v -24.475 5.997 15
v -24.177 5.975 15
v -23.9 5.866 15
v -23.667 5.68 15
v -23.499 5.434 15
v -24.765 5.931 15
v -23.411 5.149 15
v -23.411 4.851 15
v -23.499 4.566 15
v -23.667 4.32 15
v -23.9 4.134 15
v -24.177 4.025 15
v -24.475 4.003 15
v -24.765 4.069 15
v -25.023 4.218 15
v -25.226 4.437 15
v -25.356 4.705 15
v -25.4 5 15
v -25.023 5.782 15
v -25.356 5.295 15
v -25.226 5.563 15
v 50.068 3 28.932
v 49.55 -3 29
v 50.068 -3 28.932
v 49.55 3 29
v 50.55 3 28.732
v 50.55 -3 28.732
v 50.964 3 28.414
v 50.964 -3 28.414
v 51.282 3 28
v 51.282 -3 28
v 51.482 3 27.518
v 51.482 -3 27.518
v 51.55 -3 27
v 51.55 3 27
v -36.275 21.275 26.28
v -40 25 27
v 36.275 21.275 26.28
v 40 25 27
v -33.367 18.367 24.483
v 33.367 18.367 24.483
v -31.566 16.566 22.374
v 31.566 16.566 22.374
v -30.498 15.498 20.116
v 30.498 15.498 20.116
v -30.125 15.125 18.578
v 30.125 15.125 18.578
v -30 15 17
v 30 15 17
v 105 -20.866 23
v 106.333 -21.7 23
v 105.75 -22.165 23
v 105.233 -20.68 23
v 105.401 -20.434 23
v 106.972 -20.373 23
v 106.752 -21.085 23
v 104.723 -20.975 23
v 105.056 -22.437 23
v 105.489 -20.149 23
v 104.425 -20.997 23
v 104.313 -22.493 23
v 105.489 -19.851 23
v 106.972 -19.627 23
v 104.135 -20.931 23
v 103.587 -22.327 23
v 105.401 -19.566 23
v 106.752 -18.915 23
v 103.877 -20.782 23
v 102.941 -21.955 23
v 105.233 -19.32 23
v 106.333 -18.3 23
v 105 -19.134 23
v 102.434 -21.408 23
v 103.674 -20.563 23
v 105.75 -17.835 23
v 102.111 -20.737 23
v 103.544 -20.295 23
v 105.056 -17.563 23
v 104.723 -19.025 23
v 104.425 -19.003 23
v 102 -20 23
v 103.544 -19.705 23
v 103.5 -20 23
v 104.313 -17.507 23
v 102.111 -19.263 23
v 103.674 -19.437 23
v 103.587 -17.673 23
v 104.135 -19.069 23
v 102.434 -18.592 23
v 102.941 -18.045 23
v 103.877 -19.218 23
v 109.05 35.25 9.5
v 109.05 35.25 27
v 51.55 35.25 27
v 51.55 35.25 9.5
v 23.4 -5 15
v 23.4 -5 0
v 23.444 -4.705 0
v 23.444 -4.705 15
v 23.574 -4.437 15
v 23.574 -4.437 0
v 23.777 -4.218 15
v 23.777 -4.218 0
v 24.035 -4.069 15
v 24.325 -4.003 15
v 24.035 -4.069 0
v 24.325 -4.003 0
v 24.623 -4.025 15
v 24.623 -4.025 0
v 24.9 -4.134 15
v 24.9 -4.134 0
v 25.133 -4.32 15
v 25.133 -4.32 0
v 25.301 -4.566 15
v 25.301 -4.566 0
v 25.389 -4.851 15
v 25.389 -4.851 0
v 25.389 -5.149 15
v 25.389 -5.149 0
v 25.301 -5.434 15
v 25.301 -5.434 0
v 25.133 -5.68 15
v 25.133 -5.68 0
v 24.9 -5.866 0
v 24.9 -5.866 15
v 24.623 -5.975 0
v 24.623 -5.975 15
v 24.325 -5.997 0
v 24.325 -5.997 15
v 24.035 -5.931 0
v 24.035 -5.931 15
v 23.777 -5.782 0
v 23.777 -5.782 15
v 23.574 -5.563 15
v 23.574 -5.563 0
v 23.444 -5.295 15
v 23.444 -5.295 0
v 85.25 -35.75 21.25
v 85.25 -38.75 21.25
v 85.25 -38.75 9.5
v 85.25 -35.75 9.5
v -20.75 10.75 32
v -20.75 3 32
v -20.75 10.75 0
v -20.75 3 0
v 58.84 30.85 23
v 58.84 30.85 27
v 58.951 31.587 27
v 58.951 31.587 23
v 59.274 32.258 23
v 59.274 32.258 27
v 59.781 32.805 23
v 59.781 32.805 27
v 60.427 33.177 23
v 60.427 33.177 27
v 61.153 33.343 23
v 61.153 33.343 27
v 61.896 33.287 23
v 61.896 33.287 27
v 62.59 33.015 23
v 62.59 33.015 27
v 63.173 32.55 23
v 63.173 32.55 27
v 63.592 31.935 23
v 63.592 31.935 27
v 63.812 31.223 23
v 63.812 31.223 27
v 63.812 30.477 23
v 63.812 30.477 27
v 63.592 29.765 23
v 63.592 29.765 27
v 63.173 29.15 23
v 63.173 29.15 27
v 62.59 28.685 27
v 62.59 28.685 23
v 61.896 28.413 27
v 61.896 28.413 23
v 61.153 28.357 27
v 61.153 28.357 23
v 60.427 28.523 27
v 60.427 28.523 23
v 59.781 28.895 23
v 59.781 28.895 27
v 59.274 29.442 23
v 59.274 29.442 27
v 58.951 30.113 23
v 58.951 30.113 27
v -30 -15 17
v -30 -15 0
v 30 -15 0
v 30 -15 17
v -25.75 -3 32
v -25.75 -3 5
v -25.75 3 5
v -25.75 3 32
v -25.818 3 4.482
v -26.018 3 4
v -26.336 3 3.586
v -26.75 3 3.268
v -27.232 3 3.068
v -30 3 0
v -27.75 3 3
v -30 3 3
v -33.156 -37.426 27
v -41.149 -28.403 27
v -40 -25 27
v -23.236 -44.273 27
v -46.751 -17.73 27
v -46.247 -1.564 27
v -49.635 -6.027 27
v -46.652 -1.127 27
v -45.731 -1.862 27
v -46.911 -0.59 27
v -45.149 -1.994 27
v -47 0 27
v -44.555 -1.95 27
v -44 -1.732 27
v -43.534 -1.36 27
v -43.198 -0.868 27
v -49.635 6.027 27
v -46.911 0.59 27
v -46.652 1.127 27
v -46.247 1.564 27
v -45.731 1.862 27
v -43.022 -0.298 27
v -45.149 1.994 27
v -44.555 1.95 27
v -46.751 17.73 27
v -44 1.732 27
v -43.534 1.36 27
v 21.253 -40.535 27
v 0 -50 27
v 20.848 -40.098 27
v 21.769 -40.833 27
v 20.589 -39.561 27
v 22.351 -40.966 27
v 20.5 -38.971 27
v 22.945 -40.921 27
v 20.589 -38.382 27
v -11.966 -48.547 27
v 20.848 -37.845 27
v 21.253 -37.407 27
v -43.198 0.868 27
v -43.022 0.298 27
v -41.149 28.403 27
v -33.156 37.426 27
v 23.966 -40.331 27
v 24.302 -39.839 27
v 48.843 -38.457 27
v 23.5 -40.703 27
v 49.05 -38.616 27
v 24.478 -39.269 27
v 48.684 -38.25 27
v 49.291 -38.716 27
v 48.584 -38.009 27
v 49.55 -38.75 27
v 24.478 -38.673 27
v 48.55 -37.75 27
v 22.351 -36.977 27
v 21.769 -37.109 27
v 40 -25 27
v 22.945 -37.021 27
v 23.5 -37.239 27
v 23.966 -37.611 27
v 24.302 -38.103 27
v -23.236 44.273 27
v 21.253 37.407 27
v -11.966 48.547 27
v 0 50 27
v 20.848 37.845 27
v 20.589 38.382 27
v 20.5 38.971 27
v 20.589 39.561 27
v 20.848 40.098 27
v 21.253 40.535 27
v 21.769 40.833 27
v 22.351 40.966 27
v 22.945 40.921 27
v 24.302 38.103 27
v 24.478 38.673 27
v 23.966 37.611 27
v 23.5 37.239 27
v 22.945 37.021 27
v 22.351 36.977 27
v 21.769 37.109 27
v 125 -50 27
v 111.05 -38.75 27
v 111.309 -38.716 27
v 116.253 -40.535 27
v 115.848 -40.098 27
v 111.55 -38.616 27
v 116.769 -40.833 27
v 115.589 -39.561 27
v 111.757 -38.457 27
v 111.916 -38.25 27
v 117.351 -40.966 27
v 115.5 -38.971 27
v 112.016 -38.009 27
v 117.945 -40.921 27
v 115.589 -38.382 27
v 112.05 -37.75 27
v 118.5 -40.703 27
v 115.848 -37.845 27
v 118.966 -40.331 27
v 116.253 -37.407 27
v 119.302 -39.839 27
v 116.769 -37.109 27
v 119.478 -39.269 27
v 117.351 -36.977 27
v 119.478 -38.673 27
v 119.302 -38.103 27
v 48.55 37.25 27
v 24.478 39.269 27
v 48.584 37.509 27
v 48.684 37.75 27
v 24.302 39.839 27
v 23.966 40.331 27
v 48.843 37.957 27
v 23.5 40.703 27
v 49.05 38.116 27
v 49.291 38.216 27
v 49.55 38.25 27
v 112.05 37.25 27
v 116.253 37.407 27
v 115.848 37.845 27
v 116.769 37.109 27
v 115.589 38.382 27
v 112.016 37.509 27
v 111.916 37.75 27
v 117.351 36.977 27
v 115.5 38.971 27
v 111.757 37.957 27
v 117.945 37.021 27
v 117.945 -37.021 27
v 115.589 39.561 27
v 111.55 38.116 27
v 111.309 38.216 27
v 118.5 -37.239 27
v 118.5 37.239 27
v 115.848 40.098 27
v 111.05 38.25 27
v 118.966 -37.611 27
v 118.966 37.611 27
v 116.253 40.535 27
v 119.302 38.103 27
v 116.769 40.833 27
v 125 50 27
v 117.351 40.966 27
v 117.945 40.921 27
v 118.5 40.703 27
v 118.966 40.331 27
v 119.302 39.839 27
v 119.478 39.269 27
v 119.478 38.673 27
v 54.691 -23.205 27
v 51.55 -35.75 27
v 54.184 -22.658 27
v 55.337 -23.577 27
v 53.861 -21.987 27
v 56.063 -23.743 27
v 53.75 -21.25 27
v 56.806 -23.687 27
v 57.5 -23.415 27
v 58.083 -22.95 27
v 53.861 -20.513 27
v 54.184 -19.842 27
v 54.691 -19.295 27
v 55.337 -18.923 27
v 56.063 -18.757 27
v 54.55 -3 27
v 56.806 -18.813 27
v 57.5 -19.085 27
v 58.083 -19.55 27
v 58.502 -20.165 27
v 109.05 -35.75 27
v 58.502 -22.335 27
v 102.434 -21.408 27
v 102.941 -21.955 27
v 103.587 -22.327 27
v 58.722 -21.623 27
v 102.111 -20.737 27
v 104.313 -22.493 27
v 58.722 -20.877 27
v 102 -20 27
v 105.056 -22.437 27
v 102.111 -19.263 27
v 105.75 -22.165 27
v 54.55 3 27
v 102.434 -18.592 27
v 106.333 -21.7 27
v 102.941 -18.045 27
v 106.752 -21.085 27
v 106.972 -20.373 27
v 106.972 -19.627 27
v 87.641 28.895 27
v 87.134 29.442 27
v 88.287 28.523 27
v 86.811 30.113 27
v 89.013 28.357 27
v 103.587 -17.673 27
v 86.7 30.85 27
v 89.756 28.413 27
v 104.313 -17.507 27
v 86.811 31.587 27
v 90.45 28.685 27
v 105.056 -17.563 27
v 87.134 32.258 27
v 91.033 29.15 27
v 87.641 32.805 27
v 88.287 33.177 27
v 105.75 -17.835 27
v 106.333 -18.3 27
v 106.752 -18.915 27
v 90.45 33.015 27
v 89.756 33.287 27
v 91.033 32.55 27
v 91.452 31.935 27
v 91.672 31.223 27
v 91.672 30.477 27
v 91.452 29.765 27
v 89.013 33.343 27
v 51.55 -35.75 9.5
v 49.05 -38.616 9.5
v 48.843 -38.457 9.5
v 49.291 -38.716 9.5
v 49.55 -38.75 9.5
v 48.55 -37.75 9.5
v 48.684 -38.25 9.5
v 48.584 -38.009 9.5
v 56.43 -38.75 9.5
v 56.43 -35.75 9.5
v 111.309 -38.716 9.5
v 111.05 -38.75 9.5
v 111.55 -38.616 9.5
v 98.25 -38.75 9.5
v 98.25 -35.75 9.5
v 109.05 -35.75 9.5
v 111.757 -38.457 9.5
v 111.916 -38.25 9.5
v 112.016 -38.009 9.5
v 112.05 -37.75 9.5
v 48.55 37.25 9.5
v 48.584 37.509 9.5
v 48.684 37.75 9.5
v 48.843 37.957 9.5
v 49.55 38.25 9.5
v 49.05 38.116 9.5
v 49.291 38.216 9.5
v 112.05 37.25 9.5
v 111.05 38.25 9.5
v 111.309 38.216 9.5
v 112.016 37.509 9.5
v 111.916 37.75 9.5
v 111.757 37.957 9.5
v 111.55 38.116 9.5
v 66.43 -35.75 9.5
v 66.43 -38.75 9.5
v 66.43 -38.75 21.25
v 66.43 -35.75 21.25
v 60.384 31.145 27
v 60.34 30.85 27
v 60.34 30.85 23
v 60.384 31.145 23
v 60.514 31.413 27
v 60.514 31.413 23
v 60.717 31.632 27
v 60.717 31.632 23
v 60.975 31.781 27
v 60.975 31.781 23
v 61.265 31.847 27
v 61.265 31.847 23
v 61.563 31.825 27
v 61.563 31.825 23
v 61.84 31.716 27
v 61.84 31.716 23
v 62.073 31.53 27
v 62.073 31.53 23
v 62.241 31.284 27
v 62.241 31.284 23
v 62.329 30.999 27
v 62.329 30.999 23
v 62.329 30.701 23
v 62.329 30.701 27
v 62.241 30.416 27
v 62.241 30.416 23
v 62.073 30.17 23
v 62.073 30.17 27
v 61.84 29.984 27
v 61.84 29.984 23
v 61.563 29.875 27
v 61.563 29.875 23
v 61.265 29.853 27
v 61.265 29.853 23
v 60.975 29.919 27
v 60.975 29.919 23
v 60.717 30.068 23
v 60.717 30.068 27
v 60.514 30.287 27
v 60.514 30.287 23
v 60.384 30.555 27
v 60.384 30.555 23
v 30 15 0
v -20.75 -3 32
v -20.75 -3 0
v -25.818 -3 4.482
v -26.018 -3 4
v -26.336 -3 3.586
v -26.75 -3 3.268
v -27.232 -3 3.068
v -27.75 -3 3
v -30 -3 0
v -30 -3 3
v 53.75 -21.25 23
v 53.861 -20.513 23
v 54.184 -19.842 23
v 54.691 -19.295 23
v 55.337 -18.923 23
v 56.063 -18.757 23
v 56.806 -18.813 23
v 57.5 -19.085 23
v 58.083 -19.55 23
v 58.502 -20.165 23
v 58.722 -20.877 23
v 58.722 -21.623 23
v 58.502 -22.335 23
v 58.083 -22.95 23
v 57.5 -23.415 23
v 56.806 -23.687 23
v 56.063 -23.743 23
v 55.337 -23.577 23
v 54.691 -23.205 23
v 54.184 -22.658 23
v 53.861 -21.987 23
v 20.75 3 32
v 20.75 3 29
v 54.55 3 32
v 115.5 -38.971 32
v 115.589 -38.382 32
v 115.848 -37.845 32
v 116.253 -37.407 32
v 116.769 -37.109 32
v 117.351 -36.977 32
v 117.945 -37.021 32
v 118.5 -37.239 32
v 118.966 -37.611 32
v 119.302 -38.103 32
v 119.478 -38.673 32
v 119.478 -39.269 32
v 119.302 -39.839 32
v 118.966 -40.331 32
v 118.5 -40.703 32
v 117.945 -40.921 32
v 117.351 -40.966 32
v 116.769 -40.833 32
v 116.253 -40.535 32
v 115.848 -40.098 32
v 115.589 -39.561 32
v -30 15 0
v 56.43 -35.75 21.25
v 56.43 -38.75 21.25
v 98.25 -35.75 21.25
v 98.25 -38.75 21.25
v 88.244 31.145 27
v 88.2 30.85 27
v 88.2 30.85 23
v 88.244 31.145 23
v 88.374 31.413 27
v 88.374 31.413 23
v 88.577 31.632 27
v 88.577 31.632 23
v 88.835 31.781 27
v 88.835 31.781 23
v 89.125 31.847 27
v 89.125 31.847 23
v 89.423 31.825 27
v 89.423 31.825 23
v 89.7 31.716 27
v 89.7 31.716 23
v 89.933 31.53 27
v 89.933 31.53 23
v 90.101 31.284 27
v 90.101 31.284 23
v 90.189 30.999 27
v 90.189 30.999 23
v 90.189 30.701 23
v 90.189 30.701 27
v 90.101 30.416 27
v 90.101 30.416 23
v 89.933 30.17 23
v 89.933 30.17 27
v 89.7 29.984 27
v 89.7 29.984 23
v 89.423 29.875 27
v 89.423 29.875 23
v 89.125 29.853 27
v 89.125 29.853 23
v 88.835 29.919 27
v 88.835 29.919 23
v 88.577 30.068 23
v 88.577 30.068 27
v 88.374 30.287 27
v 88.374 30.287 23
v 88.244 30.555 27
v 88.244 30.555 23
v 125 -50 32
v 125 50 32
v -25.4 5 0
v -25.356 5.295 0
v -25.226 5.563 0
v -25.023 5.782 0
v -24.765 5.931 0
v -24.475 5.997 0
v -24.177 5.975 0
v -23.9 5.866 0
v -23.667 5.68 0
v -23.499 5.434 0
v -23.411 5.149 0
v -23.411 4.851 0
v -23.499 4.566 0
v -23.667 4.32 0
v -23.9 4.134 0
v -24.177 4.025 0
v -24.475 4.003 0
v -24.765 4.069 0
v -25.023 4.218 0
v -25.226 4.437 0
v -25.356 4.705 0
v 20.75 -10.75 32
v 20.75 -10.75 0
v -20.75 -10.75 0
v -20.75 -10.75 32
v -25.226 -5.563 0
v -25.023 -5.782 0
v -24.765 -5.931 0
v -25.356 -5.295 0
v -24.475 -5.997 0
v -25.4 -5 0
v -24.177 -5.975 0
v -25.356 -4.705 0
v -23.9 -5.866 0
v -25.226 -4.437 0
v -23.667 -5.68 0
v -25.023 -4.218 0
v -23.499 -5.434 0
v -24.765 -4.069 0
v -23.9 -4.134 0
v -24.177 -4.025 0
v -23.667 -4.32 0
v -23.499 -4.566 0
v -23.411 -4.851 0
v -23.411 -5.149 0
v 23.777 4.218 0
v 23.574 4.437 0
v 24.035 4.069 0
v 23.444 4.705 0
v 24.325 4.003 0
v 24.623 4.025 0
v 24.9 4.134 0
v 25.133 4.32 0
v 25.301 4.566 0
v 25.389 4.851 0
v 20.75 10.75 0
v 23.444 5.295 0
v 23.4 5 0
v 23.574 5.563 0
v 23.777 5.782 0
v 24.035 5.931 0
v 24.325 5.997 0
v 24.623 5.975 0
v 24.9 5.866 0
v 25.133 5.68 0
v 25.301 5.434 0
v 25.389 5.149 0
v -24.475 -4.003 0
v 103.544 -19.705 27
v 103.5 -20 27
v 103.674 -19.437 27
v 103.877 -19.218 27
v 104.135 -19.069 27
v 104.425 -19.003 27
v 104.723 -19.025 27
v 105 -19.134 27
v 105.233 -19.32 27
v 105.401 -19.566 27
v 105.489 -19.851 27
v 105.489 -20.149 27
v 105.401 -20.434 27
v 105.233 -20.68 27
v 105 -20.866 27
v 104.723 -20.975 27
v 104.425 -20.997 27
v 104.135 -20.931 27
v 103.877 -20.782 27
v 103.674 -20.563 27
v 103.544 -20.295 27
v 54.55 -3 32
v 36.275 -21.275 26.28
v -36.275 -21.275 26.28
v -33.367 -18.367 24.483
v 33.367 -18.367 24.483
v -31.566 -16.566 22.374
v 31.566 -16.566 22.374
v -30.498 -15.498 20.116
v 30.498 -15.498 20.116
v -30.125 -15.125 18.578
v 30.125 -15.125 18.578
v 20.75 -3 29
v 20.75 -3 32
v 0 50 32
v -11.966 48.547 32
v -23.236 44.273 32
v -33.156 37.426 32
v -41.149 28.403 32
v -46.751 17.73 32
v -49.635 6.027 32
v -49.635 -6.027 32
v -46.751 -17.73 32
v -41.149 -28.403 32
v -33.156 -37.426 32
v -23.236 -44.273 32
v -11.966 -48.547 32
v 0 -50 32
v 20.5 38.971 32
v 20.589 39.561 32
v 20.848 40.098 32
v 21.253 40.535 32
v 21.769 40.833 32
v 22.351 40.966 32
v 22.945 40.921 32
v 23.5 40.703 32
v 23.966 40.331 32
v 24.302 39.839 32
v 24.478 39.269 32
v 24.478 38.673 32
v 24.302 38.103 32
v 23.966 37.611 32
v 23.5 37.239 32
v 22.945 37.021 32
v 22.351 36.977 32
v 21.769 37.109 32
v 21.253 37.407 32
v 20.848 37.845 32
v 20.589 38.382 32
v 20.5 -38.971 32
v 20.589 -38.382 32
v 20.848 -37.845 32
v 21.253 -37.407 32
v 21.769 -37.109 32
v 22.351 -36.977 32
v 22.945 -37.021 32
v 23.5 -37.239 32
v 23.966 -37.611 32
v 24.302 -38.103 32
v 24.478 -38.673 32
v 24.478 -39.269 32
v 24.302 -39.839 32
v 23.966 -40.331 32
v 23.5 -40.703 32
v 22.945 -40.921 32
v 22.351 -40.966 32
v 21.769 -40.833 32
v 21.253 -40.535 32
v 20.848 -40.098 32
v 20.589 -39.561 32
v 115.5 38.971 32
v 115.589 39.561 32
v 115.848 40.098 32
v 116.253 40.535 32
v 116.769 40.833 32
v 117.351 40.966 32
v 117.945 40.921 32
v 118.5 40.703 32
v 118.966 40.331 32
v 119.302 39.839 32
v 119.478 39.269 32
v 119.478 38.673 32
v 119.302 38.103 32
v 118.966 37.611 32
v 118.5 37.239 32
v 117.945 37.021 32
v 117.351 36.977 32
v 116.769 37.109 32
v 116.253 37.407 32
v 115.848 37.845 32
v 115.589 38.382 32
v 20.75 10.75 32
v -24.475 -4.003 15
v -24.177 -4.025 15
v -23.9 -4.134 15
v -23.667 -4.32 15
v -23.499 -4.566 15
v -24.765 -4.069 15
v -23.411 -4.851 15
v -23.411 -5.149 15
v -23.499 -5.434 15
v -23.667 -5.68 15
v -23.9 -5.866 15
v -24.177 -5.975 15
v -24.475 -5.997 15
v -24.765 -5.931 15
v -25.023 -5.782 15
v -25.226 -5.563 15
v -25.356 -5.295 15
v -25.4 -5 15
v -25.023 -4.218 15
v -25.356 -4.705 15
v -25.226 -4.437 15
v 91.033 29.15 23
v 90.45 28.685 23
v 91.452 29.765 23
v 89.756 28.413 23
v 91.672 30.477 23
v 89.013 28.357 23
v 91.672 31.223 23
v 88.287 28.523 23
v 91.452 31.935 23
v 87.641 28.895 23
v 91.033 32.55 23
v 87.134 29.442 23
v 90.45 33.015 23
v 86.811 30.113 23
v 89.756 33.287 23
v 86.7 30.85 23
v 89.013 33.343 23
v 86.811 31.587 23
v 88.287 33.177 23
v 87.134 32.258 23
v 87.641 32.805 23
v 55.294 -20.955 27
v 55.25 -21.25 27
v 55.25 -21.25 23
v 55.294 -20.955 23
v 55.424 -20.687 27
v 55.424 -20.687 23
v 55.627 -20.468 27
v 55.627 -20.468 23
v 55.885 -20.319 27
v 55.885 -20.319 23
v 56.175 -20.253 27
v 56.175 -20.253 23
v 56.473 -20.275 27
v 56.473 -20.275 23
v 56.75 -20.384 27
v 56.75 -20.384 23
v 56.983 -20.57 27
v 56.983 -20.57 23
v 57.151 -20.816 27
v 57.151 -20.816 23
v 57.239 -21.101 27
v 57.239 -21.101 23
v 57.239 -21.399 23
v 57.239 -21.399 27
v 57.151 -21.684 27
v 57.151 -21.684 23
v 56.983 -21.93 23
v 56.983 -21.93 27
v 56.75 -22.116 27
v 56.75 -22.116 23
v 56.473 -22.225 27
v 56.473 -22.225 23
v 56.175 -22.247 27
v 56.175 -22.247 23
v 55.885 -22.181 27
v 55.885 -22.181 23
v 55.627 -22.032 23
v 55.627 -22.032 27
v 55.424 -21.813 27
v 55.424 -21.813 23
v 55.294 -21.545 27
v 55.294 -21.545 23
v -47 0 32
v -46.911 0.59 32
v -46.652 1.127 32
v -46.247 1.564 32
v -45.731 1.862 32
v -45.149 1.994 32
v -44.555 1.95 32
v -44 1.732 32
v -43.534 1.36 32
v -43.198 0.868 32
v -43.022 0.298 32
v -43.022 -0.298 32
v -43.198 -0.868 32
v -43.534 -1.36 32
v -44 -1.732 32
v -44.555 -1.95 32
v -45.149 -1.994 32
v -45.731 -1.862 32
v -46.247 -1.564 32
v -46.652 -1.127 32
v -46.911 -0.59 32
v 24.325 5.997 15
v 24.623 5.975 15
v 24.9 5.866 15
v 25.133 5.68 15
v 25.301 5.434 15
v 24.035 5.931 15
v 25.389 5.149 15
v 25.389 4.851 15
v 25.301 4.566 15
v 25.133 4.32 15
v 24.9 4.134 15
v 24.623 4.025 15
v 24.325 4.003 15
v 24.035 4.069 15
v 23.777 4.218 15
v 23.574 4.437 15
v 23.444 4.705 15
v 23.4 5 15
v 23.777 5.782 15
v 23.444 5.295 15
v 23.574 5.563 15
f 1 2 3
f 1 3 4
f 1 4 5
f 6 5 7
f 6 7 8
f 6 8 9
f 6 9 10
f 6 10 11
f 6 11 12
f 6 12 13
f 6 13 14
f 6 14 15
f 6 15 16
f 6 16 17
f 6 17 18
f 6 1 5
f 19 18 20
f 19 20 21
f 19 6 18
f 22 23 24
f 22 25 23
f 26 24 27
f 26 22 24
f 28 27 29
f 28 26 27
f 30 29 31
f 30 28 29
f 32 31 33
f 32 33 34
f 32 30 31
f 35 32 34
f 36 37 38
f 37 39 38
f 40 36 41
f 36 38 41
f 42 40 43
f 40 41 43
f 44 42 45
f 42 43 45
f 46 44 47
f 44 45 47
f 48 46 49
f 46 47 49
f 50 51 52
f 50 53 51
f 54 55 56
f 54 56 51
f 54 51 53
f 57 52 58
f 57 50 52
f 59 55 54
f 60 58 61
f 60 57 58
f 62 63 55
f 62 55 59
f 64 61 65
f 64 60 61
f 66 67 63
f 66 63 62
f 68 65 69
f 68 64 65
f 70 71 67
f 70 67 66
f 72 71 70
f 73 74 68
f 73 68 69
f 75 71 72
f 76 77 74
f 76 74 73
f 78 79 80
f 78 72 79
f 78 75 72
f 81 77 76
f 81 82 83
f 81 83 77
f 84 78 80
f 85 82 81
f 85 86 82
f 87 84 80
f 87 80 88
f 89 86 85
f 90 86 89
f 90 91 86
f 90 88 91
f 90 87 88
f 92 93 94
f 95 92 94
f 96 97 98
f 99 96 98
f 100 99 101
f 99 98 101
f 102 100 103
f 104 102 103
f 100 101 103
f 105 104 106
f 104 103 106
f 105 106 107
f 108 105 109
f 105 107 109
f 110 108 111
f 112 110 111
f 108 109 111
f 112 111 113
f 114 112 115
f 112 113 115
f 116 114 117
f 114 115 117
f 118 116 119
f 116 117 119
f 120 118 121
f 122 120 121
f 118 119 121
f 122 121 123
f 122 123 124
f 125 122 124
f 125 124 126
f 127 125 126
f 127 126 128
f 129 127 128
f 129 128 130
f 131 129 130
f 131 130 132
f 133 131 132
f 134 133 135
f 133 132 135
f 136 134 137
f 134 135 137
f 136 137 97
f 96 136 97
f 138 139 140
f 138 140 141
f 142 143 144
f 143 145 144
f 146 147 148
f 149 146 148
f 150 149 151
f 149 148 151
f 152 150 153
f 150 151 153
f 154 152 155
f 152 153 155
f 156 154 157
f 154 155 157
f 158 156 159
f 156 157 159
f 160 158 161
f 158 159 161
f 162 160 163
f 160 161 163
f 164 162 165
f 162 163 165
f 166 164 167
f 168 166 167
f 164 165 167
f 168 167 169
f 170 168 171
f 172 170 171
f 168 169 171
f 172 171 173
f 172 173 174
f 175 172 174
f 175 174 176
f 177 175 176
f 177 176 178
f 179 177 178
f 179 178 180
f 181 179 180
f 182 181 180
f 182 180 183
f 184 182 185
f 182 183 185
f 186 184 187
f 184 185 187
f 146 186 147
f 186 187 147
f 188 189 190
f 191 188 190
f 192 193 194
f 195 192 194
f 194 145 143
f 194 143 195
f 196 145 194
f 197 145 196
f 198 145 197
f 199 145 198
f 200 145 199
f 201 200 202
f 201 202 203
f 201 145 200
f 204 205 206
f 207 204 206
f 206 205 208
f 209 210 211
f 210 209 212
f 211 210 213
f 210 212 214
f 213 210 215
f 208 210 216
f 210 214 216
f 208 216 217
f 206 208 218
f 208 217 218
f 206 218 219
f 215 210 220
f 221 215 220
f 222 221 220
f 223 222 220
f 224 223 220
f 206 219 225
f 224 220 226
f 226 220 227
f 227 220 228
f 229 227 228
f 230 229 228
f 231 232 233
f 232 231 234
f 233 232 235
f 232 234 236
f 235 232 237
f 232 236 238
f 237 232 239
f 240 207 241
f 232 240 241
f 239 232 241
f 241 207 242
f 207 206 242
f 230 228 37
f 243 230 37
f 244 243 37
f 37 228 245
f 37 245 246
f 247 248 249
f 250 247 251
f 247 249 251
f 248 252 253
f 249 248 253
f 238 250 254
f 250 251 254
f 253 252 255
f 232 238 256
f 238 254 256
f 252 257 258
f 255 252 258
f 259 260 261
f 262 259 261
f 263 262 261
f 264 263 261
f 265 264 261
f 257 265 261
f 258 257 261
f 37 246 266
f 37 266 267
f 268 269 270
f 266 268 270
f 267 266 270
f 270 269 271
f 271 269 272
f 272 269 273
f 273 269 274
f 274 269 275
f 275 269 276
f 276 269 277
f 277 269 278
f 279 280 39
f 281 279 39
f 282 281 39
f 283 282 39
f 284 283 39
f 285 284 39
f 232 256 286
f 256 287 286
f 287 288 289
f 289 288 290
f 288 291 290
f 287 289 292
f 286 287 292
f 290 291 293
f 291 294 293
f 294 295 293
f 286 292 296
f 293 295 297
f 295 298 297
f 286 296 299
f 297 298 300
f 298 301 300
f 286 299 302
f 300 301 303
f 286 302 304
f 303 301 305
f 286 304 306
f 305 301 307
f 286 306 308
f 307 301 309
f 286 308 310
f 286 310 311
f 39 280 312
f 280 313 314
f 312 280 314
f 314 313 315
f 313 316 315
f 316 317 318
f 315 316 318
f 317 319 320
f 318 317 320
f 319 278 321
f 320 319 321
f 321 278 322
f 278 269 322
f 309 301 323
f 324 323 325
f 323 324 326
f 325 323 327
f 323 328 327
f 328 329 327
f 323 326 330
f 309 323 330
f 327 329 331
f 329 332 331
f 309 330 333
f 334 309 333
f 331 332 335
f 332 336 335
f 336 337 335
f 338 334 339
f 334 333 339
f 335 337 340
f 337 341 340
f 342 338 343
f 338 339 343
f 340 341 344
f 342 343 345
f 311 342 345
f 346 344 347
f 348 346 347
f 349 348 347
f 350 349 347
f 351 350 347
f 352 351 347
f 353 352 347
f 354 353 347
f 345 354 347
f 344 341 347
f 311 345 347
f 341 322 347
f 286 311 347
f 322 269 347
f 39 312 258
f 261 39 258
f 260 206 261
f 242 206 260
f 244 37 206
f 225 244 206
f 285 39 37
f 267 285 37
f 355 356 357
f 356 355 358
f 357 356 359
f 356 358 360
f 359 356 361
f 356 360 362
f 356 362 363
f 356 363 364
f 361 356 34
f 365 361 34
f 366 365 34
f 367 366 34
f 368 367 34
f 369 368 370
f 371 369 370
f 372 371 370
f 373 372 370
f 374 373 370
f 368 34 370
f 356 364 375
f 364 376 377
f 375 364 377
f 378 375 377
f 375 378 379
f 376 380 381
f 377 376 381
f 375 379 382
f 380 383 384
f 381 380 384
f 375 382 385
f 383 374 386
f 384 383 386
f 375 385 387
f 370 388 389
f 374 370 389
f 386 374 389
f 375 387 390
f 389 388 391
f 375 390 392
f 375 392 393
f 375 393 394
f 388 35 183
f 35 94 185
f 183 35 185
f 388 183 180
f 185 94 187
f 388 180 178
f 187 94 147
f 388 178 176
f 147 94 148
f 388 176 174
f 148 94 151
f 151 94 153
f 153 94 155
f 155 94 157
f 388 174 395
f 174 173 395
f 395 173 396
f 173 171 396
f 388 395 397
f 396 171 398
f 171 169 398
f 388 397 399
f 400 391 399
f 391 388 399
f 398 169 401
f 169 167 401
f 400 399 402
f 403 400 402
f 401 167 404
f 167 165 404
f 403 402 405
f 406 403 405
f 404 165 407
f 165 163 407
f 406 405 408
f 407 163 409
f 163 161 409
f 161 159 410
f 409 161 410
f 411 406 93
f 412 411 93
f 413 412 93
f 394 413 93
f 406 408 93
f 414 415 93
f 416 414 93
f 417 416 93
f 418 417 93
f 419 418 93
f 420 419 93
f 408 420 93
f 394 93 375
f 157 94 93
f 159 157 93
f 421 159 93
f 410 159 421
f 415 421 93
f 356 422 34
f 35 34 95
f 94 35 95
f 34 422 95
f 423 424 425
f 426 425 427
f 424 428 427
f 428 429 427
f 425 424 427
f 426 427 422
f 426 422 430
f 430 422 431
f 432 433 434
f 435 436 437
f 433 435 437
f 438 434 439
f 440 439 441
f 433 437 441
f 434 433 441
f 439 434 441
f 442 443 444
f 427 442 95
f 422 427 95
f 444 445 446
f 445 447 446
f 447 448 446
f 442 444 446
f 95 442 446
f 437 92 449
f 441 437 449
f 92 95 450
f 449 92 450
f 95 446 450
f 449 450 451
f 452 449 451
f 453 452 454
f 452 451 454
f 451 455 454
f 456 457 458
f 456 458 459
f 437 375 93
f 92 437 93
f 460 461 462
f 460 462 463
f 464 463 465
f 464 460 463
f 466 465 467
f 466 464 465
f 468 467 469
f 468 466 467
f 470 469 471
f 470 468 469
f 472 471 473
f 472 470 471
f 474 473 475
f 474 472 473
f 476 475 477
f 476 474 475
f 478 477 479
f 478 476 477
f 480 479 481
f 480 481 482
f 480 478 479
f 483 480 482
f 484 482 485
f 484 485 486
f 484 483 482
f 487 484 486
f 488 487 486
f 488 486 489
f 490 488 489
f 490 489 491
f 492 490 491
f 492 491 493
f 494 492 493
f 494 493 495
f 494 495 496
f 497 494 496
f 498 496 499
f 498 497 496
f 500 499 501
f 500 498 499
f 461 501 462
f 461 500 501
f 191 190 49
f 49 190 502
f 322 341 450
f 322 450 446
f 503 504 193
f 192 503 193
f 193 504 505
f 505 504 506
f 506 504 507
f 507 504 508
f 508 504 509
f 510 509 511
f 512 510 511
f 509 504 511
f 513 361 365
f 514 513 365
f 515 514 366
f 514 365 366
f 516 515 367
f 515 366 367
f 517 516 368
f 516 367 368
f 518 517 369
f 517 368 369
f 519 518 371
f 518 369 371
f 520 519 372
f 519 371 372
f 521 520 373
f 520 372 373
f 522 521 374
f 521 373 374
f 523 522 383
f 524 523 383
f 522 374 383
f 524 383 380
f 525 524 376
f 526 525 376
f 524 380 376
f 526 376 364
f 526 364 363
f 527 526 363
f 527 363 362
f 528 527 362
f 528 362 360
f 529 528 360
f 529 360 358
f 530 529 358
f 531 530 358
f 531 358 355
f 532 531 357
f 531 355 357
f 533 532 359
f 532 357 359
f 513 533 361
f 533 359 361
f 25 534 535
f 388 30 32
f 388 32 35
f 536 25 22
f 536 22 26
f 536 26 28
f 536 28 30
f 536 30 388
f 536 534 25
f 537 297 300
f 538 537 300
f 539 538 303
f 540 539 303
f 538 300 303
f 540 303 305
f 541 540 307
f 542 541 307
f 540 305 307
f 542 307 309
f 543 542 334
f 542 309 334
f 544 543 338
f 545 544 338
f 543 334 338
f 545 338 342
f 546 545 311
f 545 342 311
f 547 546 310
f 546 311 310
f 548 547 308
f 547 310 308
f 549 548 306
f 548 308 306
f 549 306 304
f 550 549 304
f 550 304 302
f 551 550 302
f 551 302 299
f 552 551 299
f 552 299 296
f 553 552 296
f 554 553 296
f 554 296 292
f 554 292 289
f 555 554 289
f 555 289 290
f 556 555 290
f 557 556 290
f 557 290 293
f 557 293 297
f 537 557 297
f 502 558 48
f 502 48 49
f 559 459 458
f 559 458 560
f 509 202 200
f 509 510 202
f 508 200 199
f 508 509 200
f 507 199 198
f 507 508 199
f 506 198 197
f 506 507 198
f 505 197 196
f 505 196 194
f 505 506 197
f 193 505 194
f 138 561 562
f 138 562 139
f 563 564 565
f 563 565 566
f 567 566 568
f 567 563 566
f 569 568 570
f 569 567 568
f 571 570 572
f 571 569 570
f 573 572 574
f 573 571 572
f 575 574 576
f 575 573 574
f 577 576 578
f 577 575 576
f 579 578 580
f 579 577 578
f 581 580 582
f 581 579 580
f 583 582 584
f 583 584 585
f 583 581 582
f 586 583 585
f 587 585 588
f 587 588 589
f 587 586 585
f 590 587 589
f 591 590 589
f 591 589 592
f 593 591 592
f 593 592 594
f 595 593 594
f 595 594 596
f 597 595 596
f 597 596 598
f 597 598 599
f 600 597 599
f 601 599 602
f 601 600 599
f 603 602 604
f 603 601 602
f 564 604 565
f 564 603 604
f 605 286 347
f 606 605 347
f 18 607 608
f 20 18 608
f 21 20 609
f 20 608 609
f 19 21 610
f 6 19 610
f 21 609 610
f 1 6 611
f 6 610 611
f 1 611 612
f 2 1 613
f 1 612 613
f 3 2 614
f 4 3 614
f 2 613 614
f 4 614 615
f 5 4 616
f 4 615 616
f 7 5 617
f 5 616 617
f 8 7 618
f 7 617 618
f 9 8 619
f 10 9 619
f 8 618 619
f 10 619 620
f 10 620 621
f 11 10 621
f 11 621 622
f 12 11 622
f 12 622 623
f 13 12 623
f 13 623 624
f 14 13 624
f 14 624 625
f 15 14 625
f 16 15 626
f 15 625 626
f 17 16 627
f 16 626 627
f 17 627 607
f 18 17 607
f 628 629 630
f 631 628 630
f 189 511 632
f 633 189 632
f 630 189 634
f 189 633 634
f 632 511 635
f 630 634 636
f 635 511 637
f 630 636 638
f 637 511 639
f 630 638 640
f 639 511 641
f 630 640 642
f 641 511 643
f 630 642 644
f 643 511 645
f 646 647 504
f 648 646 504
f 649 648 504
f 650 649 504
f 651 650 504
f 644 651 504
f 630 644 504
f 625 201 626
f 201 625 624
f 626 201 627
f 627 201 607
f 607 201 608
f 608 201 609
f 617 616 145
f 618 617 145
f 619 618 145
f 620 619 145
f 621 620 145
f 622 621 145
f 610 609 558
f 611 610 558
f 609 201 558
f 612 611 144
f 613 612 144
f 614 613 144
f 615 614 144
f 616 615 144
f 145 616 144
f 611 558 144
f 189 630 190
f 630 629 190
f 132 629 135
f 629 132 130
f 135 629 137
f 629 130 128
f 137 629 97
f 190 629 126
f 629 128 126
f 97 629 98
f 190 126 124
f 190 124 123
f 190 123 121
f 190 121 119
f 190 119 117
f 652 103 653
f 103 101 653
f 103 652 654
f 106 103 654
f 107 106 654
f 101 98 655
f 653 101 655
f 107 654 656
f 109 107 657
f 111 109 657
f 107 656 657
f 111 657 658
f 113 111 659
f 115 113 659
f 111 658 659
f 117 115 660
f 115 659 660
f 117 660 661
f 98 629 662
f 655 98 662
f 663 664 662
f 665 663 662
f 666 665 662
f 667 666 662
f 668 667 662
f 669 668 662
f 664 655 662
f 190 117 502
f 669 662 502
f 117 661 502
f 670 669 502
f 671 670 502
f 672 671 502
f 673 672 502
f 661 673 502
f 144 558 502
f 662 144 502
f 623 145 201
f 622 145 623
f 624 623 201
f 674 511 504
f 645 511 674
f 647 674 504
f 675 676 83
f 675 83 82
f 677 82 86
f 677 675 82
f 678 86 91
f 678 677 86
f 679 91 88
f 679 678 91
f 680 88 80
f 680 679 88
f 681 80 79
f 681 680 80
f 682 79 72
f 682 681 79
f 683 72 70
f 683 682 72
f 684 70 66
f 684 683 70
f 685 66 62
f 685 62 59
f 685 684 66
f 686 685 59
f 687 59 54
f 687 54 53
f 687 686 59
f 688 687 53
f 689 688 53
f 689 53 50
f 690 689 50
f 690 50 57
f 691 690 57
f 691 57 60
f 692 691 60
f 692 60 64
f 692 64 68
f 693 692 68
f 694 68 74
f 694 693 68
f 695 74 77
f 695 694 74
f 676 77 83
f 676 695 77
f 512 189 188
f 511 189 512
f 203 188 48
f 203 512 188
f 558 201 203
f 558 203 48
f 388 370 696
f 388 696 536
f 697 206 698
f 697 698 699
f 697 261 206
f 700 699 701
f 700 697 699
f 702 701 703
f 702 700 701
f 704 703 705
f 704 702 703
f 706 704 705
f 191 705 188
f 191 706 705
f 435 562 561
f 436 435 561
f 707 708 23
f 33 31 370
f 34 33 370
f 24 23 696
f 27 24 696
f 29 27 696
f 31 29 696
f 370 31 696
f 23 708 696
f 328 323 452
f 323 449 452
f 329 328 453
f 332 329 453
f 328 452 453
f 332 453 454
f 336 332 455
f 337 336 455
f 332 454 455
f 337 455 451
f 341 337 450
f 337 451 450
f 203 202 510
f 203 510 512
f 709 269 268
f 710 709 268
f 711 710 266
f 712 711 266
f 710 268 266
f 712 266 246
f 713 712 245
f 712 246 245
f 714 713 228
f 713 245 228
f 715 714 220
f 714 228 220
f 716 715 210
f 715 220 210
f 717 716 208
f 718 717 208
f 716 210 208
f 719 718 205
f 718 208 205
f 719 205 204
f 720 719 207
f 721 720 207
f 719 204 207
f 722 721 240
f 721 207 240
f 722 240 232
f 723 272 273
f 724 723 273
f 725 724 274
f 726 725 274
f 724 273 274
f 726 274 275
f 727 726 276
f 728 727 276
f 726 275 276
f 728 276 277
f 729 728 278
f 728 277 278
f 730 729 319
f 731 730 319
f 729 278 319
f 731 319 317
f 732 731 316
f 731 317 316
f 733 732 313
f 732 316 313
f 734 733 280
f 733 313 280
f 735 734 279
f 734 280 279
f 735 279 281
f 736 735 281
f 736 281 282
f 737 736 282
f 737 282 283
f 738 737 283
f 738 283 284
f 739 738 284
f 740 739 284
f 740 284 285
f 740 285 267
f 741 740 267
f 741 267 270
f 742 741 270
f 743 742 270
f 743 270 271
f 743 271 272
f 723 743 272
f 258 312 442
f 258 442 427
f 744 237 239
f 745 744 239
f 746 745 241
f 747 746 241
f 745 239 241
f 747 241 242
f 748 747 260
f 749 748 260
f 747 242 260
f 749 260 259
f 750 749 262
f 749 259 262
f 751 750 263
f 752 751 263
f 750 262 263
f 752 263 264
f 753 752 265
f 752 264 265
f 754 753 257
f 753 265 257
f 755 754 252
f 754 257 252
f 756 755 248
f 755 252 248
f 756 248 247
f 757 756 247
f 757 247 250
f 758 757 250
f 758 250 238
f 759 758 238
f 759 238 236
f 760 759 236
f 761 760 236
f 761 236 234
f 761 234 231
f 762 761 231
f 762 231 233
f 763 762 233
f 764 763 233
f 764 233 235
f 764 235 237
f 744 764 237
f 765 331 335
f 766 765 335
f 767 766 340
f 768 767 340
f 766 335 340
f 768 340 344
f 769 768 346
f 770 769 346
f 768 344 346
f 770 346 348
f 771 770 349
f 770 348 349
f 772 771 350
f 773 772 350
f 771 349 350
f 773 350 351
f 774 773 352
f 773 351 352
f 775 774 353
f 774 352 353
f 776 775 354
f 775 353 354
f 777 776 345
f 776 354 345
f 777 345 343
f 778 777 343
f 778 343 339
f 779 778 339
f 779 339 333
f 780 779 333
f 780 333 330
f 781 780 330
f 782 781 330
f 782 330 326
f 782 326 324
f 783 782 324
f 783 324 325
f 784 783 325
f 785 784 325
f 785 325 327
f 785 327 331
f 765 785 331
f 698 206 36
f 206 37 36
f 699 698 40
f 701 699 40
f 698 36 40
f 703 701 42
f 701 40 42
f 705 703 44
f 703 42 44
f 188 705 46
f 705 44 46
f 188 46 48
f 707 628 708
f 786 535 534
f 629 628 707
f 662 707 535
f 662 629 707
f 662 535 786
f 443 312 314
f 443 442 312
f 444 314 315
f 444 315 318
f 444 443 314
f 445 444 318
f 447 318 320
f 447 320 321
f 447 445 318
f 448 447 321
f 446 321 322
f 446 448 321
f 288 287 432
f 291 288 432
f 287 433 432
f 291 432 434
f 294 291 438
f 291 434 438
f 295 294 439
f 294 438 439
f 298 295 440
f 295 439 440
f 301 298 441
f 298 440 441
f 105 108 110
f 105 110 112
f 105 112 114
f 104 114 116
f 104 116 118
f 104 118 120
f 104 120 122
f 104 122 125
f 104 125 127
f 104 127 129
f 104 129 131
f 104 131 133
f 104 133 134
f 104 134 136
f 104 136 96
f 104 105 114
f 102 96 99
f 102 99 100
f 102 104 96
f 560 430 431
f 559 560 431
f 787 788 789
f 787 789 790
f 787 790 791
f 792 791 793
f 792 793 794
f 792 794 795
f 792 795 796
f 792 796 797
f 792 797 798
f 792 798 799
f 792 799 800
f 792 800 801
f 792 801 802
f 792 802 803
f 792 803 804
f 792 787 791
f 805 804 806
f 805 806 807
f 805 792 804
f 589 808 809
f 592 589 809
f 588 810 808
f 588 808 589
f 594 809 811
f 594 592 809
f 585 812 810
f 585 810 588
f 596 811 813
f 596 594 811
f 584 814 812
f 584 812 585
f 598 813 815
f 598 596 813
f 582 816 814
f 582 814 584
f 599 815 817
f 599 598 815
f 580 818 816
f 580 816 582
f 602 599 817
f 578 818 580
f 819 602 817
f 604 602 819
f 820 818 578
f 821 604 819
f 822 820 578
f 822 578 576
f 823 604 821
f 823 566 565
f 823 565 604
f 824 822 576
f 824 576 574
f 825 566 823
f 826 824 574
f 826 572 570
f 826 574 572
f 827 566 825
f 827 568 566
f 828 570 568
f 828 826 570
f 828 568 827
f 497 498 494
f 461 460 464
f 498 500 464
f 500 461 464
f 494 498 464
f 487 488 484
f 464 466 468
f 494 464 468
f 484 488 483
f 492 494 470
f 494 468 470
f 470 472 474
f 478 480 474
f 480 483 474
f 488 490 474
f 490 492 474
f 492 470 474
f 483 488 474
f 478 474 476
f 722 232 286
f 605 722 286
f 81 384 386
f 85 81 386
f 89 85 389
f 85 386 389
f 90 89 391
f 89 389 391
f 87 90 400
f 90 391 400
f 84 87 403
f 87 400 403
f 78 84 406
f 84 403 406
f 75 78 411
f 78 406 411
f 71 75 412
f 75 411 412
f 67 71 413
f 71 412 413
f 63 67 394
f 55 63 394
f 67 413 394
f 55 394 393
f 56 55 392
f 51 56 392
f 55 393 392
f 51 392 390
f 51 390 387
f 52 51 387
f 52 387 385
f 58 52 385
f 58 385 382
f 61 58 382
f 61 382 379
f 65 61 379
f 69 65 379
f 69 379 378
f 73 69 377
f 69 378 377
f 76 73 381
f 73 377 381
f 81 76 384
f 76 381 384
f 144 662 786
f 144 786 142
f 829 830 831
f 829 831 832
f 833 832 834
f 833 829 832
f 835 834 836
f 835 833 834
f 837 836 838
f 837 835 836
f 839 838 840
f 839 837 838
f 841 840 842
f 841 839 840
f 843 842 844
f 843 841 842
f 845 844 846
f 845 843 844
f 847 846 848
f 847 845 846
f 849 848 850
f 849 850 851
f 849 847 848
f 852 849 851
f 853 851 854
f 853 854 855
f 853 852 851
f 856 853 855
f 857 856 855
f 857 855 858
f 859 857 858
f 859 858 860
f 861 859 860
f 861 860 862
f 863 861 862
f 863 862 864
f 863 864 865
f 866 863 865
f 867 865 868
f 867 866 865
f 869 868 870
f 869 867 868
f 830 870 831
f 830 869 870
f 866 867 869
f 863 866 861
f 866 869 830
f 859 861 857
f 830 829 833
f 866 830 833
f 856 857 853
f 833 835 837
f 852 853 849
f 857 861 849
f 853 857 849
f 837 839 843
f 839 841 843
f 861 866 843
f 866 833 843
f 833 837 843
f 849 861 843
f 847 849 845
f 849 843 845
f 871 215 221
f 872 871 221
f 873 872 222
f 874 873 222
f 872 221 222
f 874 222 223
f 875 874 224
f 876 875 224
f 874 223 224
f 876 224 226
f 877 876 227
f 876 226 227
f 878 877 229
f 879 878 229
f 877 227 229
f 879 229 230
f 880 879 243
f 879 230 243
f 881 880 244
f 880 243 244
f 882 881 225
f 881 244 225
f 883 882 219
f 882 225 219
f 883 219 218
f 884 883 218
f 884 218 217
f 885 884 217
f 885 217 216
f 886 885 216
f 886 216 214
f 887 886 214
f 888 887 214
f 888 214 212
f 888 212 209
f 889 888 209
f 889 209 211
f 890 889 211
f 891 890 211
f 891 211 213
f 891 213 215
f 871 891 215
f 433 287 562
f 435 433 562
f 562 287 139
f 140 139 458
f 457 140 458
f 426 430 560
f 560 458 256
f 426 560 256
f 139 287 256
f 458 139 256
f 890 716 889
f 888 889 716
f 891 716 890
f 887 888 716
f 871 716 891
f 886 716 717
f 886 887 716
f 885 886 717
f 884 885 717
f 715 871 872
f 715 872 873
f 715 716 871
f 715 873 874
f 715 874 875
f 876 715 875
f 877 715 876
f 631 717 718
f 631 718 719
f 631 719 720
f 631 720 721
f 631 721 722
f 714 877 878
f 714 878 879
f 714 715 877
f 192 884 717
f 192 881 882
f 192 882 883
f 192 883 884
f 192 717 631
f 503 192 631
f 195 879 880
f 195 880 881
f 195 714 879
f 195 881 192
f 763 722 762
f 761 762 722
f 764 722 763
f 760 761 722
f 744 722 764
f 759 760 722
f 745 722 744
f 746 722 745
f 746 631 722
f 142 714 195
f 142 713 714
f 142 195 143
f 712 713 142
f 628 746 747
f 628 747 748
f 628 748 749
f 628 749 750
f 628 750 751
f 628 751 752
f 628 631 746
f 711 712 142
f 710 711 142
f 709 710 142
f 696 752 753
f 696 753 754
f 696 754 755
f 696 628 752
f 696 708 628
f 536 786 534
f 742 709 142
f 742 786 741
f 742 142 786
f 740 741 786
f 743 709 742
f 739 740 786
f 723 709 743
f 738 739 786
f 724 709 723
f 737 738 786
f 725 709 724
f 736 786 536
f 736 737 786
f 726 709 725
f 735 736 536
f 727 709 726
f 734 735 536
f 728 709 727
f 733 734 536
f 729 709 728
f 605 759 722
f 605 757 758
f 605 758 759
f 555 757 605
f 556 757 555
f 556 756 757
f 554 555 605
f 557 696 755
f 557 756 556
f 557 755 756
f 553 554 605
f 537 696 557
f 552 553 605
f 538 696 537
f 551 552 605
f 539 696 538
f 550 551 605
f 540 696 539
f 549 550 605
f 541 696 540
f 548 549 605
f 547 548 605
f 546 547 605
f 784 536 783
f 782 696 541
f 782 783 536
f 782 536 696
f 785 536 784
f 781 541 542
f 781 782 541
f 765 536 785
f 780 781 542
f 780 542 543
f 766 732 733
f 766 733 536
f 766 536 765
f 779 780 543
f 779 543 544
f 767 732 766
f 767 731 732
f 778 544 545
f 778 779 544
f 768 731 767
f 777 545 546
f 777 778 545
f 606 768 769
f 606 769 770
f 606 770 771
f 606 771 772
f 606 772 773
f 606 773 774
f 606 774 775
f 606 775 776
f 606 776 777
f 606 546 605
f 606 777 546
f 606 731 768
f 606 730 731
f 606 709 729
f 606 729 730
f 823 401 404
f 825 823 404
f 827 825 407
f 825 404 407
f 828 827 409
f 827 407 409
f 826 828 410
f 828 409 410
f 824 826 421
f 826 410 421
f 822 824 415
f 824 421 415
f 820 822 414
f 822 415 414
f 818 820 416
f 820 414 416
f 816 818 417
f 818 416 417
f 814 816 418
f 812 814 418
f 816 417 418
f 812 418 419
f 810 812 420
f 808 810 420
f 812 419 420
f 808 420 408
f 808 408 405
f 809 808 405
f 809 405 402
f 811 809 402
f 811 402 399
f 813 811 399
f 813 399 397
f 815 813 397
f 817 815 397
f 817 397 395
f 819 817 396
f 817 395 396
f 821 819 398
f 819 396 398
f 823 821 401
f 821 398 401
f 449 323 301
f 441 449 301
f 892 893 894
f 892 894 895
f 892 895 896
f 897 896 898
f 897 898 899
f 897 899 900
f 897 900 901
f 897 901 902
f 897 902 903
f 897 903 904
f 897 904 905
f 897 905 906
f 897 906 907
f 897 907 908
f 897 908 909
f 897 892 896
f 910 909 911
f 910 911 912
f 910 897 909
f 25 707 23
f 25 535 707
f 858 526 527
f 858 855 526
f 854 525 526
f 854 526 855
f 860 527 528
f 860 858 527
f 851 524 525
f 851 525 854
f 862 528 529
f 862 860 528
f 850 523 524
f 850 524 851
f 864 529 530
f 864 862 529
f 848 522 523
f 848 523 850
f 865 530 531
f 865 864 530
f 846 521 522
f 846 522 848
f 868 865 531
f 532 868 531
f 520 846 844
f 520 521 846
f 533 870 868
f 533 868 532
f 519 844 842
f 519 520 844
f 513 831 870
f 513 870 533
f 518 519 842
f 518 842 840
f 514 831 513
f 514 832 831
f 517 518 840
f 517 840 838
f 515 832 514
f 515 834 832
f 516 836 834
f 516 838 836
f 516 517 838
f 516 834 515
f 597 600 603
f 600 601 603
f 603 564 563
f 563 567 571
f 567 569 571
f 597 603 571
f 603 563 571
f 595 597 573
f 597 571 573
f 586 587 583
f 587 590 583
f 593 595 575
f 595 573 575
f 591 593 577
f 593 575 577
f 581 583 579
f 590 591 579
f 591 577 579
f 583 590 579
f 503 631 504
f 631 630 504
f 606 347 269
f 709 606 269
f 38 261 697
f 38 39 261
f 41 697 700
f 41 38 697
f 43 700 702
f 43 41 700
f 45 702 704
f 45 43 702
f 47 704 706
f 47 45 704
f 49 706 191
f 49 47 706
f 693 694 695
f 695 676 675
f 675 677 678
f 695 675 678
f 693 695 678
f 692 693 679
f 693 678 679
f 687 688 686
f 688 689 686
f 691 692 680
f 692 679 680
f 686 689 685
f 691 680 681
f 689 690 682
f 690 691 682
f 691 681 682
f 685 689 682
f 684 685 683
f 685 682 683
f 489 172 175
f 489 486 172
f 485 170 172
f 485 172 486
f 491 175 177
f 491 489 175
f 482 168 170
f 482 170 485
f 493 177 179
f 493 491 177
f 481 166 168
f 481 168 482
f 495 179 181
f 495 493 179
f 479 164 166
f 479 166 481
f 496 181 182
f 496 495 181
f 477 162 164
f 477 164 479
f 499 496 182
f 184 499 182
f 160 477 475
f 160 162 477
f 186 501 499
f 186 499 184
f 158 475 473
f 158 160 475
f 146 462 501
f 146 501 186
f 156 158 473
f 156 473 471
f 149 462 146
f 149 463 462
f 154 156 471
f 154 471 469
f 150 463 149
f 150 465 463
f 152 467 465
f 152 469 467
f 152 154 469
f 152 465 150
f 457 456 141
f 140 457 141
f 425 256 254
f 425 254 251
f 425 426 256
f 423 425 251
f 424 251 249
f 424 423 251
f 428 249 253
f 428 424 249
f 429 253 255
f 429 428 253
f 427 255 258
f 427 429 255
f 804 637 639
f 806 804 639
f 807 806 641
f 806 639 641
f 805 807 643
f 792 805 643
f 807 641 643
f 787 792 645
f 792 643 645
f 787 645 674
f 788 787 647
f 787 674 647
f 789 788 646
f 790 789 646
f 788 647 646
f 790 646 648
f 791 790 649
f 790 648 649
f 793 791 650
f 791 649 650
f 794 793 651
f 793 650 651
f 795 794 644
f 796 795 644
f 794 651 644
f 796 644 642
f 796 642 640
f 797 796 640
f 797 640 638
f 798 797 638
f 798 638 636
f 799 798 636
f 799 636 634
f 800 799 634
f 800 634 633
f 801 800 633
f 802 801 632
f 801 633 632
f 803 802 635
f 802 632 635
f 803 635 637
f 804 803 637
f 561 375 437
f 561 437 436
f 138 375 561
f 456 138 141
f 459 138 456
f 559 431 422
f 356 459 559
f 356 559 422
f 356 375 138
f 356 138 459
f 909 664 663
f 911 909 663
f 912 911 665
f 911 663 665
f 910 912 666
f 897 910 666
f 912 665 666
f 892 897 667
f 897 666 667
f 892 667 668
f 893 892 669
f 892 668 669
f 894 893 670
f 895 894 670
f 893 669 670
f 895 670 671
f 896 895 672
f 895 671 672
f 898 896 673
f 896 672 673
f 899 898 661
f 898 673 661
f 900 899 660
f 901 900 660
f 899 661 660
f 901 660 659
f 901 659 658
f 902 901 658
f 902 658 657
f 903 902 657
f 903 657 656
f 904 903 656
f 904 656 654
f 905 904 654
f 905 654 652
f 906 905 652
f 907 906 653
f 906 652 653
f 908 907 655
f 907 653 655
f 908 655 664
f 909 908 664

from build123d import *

# Parameters (mm, degrees)
SKETCH1_W           = 60
SKETCH1_H           = 30
SKETCH1_W_2         = 41.5
SKETCH1_H_2         = 21.5
BOSS_EXTRUDE1_DEPTH = 27
SKETCH2_R           = 50
BOSS_EXTRUDE2_DEPTH = 5
FILLET2_R           = 10
SKETCH6_R           = 1
CUT_EXTRUDE2_DEPTH  = 15
SKETCH7_W           = 41.5
SKETCH7_H           = 21.5
CUT_EXTRUDE3_DEPTH  = 69
SKETCH8_W           = 10
SKETCH8_H           = 6
CUT_EXTRUDE4_DEPTH  = 75
SKETCH10_W          = 74.59493419
SKETCH10_H          = 6
CUT_EXTRUDE5_DEPTH  = 3
SKETCH11_R          = 2
CUT_EXTRUDE6_DEPTH  = 16
BOSS_EXTRUDE3_DEPTH = 5
SKETCH13_R          = 2.5
SKETCH13_R_2        = 1
BOSS_EXTRUDE4_DEPTH = 4
SKETCH14_R          = 2.5
SKETCH14_R_2        = 1
BOSS_EXTRUDE5_DEPTH = 4
SKETCH15_R          = 2.5
SKETCH15_R_2        = 1
BOSS_EXTRUDE6_DEPTH = 4
BOSS_EXTRUDE8_DEPTH = 17.5
SKETCH17_W          = 3
SKETCH17_H          = 6
CUT_EXTRUDE7_DEPTH  = 17.5
SKETCH18_W          = 1.640081146
SKETCH18_H          = 6
CUT_EXTRUDE8_DEPTH  = 3
SKETCH20_W          = 13
SKETCH20_H          = 15.827650688
CUT_EXTRUDE9_DEPTH  = 25
SKETCH21_W          = 10
SKETCH21_H          = 3
CUT_EXTRUDE10_DEPTH = 13.5
SKETCH23_W          = 13
SKETCH23_H          = 3
SKETCH23_W_2        = 10
BOSS_EXTRUDE9_DEPTH = 1.75
FILLET3_R           = 1
SKETCH24_R          = 2
CUT_EXTRUDE11_DEPTH = 17
SKETCH25_W          = 10.72256849
SKETCH25_H          = 6
CUT_EXTRUDE12_DEPTH = 3
FILLET4_R           = 2


with BuildPart() as part:
    # Sketch1 → Boss-Extrude1 (new body)
    with BuildSketch(Plane.XY):
        Rectangle(SKETCH1_W, SKETCH1_H)
        Rectangle(SKETCH1_W_2, SKETCH1_H_2, mode=Mode.SUBTRACT)
    extrude(amount=BOSS_EXTRUDE1_DEPTH)

    # Sketch2 → Boss-Extrude2 (add)
    with BuildSketch(Plane.XY.offset(27)):
        Circle(SKETCH2_R)
    extrude(amount=BOSS_EXTRUDE2_DEPTH)

    # Fillet2
    fillet2_edges = [part.edges().sort_by_distance(p)[0] for p in [
        (30, 0, 27),
        (0, 15, 27),
        (-30, 0, 27),
        (0, -15, 27),
    ]]
    fillet(fillet2_edges, radius=FILLET2_R)

    # Sketch6 → Cut-Extrude2 (cut)
    with BuildSketch(Plane(origin=(0, 0, 0), x_dir=(-1, 0, 0), z_dir=(0, 0, -1))):
        with Locations((24.4, 5)):
            Circle(SKETCH6_R)
        with Locations((-24.4, 5)):
            Circle(SKETCH6_R)
        with Locations((24.4, -5)):
            Circle(SKETCH6_R)
        with Locations((-24.4, -5)):
            Circle(SKETCH6_R)
    extrude(amount=-CUT_EXTRUDE2_DEPTH, mode=Mode.SUBTRACT)

    # Sketch7 → Cut-Extrude3 (cut)
    with BuildSketch(Plane(origin=(0, 0, 0), x_dir=(-1, 0, 0), z_dir=(0, 0, -1))):
        Rectangle(SKETCH7_W, SKETCH7_H)
    extrude(amount=-CUT_EXTRUDE3_DEPTH, mode=Mode.SUBTRACT)

    # Sketch8 → Cut-Extrude4 (cut)
    with BuildSketch(Plane(origin=(0, 0, 0), x_dir=(-1, 0, 0), z_dir=(0, 0, -1))):
        with Locations((20.75, 0)):
            Rectangle(SKETCH8_W, SKETCH8_H)
    extrude(amount=-CUT_EXTRUDE4_DEPTH, mode=Mode.SUBTRACT)

    # Sketch10 → Cut-Extrude5 (cut)
    with BuildSketch(Plane.XY.offset(32)):
        with Locations((37.297467095, 0)):
            Rectangle(SKETCH10_W, SKETCH10_H)
    extrude(amount=-CUT_EXTRUDE5_DEPTH, mode=Mode.SUBTRACT)

    # Sketch11 → Cut-Extrude6 (cut)
    with BuildSketch(Plane(origin=(0, 0, 27), x_dir=(-1, 0, 0), z_dir=(0, 0, -1))):
        with Locations((45, 0)):
            Circle(SKETCH11_R)
        with Locations((-22.5, 38.97114317)):
            Circle(SKETCH11_R)
        with Locations((-22.5, -38.97114317)):
            Circle(SKETCH11_R)
    extrude(amount=-CUT_EXTRUDE6_DEPTH, mode=Mode.SUBTRACT)

    # Sketch12 → Boss-Extrude3 (add)
    with BuildSketch(Plane(origin=(0, 0, 27), x_dir=(-1, 0, 0), z_dir=(0, 0, -1))):
        with BuildLine():
            Line((0, -50), (-125, -50))
            Line((-125, -50), (-125, 50))
            Line((-125, 50), (0, 50))
            ThreePointArc((0, 50), (-50, 0), (0, -50))
        make_face()
    extrude(amount=-BOSS_EXTRUDE3_DEPTH)

    # Sketch13 → Boss-Extrude4 (add)
    with BuildSketch(Plane(origin=(0, 0, 27), x_dir=(-1, 0, 0), z_dir=(0, 0, -1))):
        with Locations((-104.5, -20)):
            Circle(SKETCH13_R)
        with Locations((-104.5, -20)):
            Circle(SKETCH13_R_2, mode=Mode.SUBTRACT)
    extrude(amount=BOSS_EXTRUDE4_DEPTH)

    # Sketch14 → Boss-Extrude5 (add)
    with BuildSketch(Plane(origin=(0, 0, 27), x_dir=(-1, 0, 0), z_dir=(0, 0, -1))):
        with Locations((-56.25, -21.25)):
            Circle(SKETCH14_R)
        with Locations((-56.25, -21.25)):
            Circle(SKETCH14_R_2, mode=Mode.SUBTRACT)
    extrude(amount=BOSS_EXTRUDE5_DEPTH)

    # Sketch15 → Boss-Extrude6 (add)
    with BuildSketch(Plane(origin=(0, 0, 27), x_dir=(-1, 0, 0), z_dir=(0, 0, -1))):
        with Locations((-61.34, 30.85)):
            Circle(SKETCH15_R)
        with Locations((-61.34, 30.85)):
            Circle(SKETCH15_R_2, mode=Mode.SUBTRACT)
        with Locations((-89.2, 30.85)):
            Circle(SKETCH15_R)
        with Locations((-89.2, 30.85)):
            Circle(SKETCH15_R_2, mode=Mode.SUBTRACT)
    extrude(amount=BOSS_EXTRUDE6_DEPTH)

    # Sketch16 → Boss-Extrude8 (add)
    with BuildSketch(Plane(origin=(0, 0, 27), x_dir=(-1, 0, 0), z_dir=(0, 0, -1))):
        Polygon((-112.05, 38.25), (-48.55, 38.25), (-48.55, -38.75), (-112.05, -38.75), (-112.05, 7.205124567), align=None)
        Polygon((-109.05, 7.205124567), (-109.05, 35.25), (-51.55, 35.25), (-51.55, -35.75), (-109.05, -35.75), align=None, mode=Mode.SUBTRACT)
    extrude(amount=BOSS_EXTRUDE8_DEPTH)

    # Sketch17 → Cut-Extrude7 (cut)
    with BuildSketch(Plane(origin=(0, 0, 27), x_dir=(-1, 0, 0), z_dir=(0, 0, -1))):
        with Locations((-53.05, 0)):
            Rectangle(SKETCH17_W, SKETCH17_H)
    extrude(amount=-CUT_EXTRUDE7_DEPTH, mode=Mode.SUBTRACT)

    # Sketch18 → Cut-Extrude8 (cut)
    with BuildSketch(Plane.XY.offset(32)):
        with Locations((50.729959427, 0)):
            Rectangle(SKETCH18_W, SKETCH18_H)
    extrude(amount=-CUT_EXTRUDE8_DEPTH, mode=Mode.SUBTRACT)

    # Sketch20 → Cut-Extrude9 (cut)
    with BuildSketch(Plane(origin=(0, 0, 23), x_dir=(-1, 0, 0), z_dir=(0, 0, -1))):
        with Locations((-91.75, -35.907506038)):
            Rectangle(SKETCH20_W, SKETCH20_H)
    extrude(amount=CUT_EXTRUDE9_DEPTH, mode=Mode.SUBTRACT)

    # Sketch21 → Cut-Extrude10 (cut)
    with BuildSketch(Plane(origin=(0, 0, 9.5), x_dir=(-1, 0, 0), z_dir=(0, 0, -1))):
        with Locations((-61.43, -37.25)):
            Rectangle(SKETCH21_W, SKETCH21_H)
    extrude(amount=-CUT_EXTRUDE10_DEPTH, mode=Mode.SUBTRACT)

    # Sketch23 → Boss-Extrude9 (add)
    with BuildSketch(Plane(origin=(0, 0, 23), x_dir=(-1, 0, 0), z_dir=(0, 0, -1))):
        with Locations((-91.75, -37.25)):
            Rectangle(SKETCH23_W, SKETCH23_H)
        with Locations((-61.43, -37.25)):
            Rectangle(SKETCH23_W_2, SKETCH23_H)
    extrude(amount=BOSS_EXTRUDE9_DEPTH)

    # Fillet3
    fillet3_edges = [part.edges().sort_by_distance(p)[0] for p in [
        (112.05, 38.25, 18.25),
        (112.05, -38.75, 18.25),
        (48.55, -38.75, 18.25),
        (48.55, 38.25, 18.25),
    ]]
    fillet(fillet3_edges, radius=FILLET3_R)

    # Sketch24 → Cut-Extrude11 (cut)
    with BuildSketch(Plane(origin=(0, 0, 27), x_dir=(-1, 0, 0), z_dir=(0, 0, -1))):
        with Locations((-117.5, 38.97114317)):
            Circle(SKETCH24_R)
        with Locations((-117.5, -38.97114317)):
            Circle(SKETCH24_R)
    extrude(amount=-CUT_EXTRUDE11_DEPTH, mode=Mode.SUBTRACT)

    # Sketch25 → Cut-Extrude12 (cut)
    with BuildSketch(Plane(origin=(0, 0, 0), x_dir=(-1, 0, 0), z_dir=(0, 0, -1))):
        with Locations((25.75, 0)):
            Rectangle(SKETCH25_W, SKETCH25_H)
    extrude(amount=-CUT_EXTRUDE12_DEPTH, mode=Mode.SUBTRACT)

    # Fillet4
    fillet4_edges = [part.edges().sort_by_distance(p)[0] for p in [
        (-25.75, 0, 3),
        (51.55, 0, 29),
    ]]
    fillet(fillet4_edges, radius=FILLET4_R)


solid = part.part
